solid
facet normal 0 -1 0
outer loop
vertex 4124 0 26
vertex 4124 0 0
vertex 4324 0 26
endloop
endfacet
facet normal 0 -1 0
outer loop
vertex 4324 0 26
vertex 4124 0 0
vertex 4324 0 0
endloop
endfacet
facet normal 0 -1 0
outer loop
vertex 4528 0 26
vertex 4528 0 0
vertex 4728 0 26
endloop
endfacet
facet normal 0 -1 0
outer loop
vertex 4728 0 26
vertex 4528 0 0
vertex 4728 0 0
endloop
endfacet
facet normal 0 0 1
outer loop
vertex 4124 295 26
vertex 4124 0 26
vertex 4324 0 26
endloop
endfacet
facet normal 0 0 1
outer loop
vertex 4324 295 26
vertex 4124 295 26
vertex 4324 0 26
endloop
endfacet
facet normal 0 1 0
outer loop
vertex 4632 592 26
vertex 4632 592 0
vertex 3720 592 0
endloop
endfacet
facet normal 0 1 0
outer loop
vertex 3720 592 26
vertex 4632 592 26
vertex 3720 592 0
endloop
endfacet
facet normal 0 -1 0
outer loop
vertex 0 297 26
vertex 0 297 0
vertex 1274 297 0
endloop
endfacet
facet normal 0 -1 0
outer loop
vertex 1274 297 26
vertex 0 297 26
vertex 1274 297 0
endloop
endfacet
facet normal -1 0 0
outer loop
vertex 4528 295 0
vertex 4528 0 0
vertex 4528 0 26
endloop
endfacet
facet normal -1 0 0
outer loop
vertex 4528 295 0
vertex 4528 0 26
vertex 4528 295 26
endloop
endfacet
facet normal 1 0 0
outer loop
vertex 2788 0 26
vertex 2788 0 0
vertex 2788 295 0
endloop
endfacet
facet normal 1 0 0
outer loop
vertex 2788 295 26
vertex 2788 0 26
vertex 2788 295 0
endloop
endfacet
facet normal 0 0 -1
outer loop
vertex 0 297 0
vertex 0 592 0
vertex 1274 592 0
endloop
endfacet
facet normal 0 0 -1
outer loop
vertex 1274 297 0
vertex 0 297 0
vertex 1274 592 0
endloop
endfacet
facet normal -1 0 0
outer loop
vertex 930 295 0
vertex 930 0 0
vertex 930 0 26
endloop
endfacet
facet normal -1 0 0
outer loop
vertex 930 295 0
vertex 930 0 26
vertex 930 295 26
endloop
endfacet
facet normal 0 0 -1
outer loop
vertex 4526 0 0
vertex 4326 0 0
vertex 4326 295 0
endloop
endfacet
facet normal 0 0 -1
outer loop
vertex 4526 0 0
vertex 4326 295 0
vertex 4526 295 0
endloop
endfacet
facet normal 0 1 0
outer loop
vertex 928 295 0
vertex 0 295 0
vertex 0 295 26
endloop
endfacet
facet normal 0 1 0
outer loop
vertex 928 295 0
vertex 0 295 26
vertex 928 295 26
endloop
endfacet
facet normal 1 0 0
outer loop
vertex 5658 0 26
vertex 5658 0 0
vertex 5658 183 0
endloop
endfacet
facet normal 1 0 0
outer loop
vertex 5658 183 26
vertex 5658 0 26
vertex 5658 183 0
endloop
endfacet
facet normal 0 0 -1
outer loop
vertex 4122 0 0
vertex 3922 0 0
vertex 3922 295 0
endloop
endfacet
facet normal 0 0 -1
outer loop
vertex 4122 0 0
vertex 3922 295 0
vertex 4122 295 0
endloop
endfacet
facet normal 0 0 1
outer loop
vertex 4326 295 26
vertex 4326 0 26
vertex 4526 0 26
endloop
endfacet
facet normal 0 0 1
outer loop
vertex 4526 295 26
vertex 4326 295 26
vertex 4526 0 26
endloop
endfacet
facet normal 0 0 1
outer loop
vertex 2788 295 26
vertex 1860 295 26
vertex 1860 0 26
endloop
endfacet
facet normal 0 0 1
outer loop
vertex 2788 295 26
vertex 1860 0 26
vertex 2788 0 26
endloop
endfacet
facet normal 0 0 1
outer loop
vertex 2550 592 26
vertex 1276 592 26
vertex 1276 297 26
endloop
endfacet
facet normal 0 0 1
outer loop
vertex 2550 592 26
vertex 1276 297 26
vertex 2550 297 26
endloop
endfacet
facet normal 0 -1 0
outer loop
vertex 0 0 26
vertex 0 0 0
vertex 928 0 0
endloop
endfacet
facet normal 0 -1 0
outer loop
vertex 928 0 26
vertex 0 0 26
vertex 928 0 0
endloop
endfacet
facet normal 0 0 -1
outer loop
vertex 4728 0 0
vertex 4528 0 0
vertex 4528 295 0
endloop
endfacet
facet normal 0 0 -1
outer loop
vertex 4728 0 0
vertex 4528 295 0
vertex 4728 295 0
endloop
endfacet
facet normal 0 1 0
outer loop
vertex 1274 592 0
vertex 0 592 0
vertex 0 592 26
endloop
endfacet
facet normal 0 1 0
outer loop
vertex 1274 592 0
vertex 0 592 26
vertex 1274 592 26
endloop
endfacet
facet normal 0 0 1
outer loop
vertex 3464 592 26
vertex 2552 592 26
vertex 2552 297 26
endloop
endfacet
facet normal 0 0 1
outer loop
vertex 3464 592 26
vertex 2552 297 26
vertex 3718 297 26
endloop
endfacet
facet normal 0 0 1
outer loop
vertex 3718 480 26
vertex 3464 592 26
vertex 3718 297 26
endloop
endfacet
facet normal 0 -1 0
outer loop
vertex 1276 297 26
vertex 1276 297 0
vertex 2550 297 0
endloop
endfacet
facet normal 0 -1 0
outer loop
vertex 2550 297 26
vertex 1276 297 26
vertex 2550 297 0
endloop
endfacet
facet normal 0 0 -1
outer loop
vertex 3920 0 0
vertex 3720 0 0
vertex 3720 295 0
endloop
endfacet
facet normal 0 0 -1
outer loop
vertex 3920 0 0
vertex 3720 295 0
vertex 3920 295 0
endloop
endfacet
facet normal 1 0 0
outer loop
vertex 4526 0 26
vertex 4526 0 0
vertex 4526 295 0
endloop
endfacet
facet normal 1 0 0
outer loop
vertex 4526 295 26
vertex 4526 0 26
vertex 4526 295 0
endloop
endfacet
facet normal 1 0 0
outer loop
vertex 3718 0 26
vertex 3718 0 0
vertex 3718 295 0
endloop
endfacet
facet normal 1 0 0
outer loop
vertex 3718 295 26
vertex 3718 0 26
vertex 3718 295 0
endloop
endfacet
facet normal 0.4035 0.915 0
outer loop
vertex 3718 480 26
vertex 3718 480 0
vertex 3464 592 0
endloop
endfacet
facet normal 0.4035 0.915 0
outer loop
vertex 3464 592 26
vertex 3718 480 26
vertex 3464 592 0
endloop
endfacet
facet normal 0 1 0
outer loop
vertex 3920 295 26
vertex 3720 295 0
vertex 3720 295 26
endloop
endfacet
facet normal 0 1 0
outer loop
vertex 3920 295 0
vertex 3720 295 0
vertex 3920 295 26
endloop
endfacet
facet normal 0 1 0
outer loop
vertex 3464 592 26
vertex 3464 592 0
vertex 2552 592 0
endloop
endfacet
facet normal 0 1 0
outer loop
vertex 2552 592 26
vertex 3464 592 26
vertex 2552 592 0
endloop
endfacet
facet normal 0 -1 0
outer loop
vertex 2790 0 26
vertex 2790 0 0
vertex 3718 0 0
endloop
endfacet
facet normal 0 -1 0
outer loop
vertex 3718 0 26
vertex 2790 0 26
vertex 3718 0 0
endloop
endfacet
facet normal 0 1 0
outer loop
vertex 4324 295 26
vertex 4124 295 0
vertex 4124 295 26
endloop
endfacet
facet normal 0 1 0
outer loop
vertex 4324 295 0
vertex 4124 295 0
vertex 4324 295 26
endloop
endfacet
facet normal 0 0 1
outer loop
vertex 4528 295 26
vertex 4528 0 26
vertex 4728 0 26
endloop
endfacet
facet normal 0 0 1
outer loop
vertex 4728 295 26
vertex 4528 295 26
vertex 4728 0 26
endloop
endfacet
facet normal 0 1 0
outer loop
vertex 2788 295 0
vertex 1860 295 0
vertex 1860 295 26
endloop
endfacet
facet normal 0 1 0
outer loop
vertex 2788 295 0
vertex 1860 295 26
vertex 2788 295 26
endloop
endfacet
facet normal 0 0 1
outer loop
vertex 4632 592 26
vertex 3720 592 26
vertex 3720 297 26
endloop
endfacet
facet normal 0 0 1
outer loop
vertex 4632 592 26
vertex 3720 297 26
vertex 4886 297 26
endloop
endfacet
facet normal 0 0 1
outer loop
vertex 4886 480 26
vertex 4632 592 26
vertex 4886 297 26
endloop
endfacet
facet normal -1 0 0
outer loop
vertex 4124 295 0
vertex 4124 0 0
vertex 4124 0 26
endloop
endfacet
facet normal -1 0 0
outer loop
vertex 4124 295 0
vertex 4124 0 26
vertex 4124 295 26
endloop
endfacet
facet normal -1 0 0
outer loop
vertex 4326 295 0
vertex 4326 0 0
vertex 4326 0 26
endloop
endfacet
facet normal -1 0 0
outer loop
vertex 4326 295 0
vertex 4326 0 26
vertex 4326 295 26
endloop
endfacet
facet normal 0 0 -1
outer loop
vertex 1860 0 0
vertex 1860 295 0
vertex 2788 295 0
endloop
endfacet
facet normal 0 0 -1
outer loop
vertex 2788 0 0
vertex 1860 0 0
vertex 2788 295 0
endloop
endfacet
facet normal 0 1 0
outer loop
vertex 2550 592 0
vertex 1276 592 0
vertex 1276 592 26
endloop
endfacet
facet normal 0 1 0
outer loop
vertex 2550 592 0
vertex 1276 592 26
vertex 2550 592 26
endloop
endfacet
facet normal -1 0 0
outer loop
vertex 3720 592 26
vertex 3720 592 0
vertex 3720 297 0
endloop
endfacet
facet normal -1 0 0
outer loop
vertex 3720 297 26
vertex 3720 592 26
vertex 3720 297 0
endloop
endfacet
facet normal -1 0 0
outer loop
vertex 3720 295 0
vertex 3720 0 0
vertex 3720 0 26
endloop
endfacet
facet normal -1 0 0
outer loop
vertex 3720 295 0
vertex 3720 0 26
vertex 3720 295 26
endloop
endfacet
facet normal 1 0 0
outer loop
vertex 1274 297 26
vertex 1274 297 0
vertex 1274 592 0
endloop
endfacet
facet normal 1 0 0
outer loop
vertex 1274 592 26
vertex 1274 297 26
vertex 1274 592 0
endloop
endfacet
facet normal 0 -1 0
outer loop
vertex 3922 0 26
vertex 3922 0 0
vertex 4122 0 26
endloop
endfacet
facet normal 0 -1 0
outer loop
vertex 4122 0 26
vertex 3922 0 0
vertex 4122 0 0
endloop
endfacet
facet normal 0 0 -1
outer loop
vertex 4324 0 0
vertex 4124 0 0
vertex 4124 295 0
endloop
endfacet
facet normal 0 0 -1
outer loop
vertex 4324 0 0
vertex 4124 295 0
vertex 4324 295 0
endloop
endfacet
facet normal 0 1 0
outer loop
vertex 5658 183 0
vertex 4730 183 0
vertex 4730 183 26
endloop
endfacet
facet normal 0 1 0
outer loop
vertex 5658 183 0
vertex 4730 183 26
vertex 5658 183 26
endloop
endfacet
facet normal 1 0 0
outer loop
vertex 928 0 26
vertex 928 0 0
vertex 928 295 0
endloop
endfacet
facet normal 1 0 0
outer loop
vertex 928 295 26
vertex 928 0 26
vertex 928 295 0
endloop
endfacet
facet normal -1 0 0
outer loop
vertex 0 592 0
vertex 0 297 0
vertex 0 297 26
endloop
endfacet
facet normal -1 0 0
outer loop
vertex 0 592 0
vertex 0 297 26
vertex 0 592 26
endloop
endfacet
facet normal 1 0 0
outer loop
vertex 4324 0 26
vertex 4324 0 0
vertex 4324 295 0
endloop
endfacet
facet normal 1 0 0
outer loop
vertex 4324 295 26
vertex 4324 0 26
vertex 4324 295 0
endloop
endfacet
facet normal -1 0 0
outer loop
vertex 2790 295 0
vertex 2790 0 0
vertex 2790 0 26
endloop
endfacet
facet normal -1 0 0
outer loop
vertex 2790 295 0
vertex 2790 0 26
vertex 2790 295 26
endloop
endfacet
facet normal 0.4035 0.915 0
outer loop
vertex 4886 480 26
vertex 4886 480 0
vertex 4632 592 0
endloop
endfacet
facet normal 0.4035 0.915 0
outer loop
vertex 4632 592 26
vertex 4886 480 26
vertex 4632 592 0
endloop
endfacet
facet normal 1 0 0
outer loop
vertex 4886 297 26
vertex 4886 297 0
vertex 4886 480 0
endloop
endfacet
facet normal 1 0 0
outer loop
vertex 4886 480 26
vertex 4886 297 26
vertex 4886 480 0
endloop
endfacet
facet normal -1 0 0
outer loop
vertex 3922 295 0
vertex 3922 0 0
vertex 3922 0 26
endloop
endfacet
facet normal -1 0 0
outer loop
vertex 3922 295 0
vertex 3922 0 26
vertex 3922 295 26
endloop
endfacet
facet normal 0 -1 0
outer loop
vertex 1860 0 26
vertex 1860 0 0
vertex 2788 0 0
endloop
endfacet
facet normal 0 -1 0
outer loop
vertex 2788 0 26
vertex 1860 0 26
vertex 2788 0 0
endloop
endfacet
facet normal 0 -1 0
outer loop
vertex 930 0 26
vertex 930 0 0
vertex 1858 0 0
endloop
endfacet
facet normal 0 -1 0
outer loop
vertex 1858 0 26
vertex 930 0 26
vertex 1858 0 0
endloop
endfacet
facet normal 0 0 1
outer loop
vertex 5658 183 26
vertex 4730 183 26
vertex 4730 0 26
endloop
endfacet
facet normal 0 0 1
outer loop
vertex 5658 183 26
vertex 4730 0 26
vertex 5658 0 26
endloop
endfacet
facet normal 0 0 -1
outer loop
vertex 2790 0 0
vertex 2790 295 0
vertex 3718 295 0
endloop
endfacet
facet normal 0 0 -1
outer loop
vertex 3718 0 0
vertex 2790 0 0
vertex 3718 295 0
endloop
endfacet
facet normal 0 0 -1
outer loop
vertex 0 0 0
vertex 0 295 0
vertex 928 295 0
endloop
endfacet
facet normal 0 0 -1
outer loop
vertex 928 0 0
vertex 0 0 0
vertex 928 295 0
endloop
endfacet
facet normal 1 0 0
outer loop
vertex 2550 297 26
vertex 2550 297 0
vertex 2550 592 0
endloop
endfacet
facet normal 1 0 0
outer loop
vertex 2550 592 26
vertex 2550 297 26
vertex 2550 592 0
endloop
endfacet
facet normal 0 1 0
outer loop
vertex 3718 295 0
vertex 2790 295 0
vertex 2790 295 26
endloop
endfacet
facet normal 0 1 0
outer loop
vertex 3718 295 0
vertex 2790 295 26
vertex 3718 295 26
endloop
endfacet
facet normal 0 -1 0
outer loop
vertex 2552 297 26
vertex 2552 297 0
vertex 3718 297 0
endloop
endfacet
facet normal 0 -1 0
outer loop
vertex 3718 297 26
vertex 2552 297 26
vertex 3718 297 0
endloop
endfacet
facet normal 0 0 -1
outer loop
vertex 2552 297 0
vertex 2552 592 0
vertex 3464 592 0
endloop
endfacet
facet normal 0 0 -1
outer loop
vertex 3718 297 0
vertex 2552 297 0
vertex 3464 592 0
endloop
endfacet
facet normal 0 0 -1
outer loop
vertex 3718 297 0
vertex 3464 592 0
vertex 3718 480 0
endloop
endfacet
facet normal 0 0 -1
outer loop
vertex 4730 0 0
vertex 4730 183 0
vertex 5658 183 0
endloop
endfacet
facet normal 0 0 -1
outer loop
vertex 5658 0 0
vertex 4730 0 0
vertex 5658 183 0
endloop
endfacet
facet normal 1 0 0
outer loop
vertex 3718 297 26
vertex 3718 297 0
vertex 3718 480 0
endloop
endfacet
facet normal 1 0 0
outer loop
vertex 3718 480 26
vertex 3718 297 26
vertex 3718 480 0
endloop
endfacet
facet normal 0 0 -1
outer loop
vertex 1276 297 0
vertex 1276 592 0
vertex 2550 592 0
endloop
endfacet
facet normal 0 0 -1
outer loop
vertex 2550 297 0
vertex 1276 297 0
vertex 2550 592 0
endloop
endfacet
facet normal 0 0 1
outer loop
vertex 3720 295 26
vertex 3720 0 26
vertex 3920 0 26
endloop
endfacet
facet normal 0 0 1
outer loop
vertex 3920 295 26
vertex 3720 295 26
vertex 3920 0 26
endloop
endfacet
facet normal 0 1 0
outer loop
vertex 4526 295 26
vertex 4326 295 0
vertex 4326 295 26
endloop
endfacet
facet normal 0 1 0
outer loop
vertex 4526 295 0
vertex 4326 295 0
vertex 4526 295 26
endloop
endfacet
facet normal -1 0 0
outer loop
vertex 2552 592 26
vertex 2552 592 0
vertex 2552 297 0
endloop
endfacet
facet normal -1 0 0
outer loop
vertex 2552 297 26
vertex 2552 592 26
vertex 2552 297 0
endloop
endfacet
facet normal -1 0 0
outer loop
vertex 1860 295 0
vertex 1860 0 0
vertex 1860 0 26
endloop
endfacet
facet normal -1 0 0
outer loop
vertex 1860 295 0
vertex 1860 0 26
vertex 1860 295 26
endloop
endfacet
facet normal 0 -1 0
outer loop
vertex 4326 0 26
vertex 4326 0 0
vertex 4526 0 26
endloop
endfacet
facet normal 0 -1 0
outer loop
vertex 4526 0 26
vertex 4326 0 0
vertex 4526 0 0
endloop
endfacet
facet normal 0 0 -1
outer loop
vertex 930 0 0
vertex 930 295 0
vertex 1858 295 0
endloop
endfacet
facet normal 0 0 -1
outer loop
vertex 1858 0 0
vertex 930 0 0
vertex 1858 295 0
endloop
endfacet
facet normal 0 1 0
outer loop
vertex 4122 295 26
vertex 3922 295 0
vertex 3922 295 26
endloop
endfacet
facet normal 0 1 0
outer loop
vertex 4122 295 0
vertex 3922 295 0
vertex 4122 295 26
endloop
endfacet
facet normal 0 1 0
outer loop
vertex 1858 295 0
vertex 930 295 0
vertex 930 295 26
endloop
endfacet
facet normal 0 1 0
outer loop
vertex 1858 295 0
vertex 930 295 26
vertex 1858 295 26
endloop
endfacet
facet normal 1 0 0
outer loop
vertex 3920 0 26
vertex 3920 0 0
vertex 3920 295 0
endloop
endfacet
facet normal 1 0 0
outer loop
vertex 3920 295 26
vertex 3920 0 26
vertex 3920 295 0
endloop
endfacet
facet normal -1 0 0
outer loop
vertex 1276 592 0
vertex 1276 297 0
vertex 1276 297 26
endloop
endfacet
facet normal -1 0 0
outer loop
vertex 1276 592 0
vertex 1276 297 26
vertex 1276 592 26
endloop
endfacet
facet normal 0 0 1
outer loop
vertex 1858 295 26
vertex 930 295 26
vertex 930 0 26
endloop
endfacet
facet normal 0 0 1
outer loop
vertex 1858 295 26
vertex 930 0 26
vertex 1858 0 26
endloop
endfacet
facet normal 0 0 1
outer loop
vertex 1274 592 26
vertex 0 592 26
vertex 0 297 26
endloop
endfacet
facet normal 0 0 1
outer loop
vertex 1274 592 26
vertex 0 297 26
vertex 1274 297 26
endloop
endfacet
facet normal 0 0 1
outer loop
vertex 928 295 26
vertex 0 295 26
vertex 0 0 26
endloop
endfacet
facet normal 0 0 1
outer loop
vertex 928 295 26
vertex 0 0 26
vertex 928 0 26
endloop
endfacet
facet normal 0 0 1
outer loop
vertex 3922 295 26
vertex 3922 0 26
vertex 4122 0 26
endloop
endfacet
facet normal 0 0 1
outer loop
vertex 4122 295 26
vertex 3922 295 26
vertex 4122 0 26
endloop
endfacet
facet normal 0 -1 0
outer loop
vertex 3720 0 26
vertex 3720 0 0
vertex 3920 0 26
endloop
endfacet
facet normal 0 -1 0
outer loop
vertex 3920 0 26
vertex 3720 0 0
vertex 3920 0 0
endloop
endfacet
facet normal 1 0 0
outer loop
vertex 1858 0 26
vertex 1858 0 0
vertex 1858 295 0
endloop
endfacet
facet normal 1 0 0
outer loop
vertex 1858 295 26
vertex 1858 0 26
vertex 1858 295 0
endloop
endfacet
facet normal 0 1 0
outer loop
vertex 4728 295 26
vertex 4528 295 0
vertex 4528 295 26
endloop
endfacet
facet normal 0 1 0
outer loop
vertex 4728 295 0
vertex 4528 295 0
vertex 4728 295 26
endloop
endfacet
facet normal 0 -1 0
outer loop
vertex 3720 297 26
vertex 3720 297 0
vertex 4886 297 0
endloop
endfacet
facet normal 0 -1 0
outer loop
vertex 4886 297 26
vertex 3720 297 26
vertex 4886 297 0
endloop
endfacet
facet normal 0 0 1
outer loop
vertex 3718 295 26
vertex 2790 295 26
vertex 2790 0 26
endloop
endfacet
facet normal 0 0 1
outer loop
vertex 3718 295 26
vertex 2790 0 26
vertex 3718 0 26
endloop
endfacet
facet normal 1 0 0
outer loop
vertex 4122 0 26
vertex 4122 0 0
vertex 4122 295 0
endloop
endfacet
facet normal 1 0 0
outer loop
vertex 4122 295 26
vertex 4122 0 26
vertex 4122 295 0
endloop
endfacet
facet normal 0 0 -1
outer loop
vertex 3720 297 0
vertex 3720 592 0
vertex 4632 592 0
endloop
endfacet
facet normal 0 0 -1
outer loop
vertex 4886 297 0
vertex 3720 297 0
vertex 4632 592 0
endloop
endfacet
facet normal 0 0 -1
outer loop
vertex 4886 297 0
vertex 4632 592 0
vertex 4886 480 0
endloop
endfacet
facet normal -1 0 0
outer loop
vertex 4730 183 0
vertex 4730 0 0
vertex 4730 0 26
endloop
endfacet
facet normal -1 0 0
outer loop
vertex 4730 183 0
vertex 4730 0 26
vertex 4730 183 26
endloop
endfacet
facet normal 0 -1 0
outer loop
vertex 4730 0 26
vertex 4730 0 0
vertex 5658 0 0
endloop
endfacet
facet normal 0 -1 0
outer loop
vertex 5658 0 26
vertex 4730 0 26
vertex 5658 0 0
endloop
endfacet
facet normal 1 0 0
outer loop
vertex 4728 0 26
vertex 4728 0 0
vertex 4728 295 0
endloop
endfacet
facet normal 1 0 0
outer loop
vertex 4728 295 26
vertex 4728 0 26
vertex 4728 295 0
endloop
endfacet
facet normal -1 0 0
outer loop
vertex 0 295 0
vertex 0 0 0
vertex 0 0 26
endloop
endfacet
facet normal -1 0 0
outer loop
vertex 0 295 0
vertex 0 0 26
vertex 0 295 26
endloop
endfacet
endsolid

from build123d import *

# Parameters (mm, degrees)
F0_W     = 928
F0_H     = 295
F0_W_2   = 1274
F0_W_3   = 200
F0_H_2   = 183
F1_DEPTH = 26


with BuildPart() as f1:
    # F0 (on Top) → F1 (new body)
    with BuildSketch(Plane.XY):
        with Locations((464, 147.5)):
            Rectangle(F0_W, F0_H)
        with Locations((1394, 147.5)):
            Rectangle(F0_W, F0_H)
        with Locations((2324, 147.5)):
            Rectangle(F0_W, F0_H)
        with Locations((3254, 147.5)):
            Rectangle(F0_W, F0_H)
        with Locations((637, 444.5)):
            Rectangle(F0_W_2, F0_H)
        with Locations((1913, 444.5)):
            Rectangle(F0_W_2, F0_H)
        Polygon((2552, 592), (2552, 297), (3718, 297), (3718, 480), (3464, 592), align=None)
        with Locations((3820, 147.5)):
            Rectangle(F0_W_3, F0_H)
        with Locations((4022, 147.5)):
            Rectangle(F0_W_3, F0_H)
        with Locations((4224, 147.5)):
            Rectangle(F0_W_3, F0_H)
        with Locations((4426, 147.5)):
            Rectangle(F0_W_3, F0_H)
        with Locations((4628, 147.5)):
            Rectangle(F0_W_3, F0_H)
        with Locations((5194, 91.5)):
            Rectangle(F0_W, F0_H_2)
        Polygon((4886, 297), (4886, 480), (4632, 592), (3720, 592), (3720, 297), align=None)
    extrude(amount=F1_DEPTH)


solid = f1.part
